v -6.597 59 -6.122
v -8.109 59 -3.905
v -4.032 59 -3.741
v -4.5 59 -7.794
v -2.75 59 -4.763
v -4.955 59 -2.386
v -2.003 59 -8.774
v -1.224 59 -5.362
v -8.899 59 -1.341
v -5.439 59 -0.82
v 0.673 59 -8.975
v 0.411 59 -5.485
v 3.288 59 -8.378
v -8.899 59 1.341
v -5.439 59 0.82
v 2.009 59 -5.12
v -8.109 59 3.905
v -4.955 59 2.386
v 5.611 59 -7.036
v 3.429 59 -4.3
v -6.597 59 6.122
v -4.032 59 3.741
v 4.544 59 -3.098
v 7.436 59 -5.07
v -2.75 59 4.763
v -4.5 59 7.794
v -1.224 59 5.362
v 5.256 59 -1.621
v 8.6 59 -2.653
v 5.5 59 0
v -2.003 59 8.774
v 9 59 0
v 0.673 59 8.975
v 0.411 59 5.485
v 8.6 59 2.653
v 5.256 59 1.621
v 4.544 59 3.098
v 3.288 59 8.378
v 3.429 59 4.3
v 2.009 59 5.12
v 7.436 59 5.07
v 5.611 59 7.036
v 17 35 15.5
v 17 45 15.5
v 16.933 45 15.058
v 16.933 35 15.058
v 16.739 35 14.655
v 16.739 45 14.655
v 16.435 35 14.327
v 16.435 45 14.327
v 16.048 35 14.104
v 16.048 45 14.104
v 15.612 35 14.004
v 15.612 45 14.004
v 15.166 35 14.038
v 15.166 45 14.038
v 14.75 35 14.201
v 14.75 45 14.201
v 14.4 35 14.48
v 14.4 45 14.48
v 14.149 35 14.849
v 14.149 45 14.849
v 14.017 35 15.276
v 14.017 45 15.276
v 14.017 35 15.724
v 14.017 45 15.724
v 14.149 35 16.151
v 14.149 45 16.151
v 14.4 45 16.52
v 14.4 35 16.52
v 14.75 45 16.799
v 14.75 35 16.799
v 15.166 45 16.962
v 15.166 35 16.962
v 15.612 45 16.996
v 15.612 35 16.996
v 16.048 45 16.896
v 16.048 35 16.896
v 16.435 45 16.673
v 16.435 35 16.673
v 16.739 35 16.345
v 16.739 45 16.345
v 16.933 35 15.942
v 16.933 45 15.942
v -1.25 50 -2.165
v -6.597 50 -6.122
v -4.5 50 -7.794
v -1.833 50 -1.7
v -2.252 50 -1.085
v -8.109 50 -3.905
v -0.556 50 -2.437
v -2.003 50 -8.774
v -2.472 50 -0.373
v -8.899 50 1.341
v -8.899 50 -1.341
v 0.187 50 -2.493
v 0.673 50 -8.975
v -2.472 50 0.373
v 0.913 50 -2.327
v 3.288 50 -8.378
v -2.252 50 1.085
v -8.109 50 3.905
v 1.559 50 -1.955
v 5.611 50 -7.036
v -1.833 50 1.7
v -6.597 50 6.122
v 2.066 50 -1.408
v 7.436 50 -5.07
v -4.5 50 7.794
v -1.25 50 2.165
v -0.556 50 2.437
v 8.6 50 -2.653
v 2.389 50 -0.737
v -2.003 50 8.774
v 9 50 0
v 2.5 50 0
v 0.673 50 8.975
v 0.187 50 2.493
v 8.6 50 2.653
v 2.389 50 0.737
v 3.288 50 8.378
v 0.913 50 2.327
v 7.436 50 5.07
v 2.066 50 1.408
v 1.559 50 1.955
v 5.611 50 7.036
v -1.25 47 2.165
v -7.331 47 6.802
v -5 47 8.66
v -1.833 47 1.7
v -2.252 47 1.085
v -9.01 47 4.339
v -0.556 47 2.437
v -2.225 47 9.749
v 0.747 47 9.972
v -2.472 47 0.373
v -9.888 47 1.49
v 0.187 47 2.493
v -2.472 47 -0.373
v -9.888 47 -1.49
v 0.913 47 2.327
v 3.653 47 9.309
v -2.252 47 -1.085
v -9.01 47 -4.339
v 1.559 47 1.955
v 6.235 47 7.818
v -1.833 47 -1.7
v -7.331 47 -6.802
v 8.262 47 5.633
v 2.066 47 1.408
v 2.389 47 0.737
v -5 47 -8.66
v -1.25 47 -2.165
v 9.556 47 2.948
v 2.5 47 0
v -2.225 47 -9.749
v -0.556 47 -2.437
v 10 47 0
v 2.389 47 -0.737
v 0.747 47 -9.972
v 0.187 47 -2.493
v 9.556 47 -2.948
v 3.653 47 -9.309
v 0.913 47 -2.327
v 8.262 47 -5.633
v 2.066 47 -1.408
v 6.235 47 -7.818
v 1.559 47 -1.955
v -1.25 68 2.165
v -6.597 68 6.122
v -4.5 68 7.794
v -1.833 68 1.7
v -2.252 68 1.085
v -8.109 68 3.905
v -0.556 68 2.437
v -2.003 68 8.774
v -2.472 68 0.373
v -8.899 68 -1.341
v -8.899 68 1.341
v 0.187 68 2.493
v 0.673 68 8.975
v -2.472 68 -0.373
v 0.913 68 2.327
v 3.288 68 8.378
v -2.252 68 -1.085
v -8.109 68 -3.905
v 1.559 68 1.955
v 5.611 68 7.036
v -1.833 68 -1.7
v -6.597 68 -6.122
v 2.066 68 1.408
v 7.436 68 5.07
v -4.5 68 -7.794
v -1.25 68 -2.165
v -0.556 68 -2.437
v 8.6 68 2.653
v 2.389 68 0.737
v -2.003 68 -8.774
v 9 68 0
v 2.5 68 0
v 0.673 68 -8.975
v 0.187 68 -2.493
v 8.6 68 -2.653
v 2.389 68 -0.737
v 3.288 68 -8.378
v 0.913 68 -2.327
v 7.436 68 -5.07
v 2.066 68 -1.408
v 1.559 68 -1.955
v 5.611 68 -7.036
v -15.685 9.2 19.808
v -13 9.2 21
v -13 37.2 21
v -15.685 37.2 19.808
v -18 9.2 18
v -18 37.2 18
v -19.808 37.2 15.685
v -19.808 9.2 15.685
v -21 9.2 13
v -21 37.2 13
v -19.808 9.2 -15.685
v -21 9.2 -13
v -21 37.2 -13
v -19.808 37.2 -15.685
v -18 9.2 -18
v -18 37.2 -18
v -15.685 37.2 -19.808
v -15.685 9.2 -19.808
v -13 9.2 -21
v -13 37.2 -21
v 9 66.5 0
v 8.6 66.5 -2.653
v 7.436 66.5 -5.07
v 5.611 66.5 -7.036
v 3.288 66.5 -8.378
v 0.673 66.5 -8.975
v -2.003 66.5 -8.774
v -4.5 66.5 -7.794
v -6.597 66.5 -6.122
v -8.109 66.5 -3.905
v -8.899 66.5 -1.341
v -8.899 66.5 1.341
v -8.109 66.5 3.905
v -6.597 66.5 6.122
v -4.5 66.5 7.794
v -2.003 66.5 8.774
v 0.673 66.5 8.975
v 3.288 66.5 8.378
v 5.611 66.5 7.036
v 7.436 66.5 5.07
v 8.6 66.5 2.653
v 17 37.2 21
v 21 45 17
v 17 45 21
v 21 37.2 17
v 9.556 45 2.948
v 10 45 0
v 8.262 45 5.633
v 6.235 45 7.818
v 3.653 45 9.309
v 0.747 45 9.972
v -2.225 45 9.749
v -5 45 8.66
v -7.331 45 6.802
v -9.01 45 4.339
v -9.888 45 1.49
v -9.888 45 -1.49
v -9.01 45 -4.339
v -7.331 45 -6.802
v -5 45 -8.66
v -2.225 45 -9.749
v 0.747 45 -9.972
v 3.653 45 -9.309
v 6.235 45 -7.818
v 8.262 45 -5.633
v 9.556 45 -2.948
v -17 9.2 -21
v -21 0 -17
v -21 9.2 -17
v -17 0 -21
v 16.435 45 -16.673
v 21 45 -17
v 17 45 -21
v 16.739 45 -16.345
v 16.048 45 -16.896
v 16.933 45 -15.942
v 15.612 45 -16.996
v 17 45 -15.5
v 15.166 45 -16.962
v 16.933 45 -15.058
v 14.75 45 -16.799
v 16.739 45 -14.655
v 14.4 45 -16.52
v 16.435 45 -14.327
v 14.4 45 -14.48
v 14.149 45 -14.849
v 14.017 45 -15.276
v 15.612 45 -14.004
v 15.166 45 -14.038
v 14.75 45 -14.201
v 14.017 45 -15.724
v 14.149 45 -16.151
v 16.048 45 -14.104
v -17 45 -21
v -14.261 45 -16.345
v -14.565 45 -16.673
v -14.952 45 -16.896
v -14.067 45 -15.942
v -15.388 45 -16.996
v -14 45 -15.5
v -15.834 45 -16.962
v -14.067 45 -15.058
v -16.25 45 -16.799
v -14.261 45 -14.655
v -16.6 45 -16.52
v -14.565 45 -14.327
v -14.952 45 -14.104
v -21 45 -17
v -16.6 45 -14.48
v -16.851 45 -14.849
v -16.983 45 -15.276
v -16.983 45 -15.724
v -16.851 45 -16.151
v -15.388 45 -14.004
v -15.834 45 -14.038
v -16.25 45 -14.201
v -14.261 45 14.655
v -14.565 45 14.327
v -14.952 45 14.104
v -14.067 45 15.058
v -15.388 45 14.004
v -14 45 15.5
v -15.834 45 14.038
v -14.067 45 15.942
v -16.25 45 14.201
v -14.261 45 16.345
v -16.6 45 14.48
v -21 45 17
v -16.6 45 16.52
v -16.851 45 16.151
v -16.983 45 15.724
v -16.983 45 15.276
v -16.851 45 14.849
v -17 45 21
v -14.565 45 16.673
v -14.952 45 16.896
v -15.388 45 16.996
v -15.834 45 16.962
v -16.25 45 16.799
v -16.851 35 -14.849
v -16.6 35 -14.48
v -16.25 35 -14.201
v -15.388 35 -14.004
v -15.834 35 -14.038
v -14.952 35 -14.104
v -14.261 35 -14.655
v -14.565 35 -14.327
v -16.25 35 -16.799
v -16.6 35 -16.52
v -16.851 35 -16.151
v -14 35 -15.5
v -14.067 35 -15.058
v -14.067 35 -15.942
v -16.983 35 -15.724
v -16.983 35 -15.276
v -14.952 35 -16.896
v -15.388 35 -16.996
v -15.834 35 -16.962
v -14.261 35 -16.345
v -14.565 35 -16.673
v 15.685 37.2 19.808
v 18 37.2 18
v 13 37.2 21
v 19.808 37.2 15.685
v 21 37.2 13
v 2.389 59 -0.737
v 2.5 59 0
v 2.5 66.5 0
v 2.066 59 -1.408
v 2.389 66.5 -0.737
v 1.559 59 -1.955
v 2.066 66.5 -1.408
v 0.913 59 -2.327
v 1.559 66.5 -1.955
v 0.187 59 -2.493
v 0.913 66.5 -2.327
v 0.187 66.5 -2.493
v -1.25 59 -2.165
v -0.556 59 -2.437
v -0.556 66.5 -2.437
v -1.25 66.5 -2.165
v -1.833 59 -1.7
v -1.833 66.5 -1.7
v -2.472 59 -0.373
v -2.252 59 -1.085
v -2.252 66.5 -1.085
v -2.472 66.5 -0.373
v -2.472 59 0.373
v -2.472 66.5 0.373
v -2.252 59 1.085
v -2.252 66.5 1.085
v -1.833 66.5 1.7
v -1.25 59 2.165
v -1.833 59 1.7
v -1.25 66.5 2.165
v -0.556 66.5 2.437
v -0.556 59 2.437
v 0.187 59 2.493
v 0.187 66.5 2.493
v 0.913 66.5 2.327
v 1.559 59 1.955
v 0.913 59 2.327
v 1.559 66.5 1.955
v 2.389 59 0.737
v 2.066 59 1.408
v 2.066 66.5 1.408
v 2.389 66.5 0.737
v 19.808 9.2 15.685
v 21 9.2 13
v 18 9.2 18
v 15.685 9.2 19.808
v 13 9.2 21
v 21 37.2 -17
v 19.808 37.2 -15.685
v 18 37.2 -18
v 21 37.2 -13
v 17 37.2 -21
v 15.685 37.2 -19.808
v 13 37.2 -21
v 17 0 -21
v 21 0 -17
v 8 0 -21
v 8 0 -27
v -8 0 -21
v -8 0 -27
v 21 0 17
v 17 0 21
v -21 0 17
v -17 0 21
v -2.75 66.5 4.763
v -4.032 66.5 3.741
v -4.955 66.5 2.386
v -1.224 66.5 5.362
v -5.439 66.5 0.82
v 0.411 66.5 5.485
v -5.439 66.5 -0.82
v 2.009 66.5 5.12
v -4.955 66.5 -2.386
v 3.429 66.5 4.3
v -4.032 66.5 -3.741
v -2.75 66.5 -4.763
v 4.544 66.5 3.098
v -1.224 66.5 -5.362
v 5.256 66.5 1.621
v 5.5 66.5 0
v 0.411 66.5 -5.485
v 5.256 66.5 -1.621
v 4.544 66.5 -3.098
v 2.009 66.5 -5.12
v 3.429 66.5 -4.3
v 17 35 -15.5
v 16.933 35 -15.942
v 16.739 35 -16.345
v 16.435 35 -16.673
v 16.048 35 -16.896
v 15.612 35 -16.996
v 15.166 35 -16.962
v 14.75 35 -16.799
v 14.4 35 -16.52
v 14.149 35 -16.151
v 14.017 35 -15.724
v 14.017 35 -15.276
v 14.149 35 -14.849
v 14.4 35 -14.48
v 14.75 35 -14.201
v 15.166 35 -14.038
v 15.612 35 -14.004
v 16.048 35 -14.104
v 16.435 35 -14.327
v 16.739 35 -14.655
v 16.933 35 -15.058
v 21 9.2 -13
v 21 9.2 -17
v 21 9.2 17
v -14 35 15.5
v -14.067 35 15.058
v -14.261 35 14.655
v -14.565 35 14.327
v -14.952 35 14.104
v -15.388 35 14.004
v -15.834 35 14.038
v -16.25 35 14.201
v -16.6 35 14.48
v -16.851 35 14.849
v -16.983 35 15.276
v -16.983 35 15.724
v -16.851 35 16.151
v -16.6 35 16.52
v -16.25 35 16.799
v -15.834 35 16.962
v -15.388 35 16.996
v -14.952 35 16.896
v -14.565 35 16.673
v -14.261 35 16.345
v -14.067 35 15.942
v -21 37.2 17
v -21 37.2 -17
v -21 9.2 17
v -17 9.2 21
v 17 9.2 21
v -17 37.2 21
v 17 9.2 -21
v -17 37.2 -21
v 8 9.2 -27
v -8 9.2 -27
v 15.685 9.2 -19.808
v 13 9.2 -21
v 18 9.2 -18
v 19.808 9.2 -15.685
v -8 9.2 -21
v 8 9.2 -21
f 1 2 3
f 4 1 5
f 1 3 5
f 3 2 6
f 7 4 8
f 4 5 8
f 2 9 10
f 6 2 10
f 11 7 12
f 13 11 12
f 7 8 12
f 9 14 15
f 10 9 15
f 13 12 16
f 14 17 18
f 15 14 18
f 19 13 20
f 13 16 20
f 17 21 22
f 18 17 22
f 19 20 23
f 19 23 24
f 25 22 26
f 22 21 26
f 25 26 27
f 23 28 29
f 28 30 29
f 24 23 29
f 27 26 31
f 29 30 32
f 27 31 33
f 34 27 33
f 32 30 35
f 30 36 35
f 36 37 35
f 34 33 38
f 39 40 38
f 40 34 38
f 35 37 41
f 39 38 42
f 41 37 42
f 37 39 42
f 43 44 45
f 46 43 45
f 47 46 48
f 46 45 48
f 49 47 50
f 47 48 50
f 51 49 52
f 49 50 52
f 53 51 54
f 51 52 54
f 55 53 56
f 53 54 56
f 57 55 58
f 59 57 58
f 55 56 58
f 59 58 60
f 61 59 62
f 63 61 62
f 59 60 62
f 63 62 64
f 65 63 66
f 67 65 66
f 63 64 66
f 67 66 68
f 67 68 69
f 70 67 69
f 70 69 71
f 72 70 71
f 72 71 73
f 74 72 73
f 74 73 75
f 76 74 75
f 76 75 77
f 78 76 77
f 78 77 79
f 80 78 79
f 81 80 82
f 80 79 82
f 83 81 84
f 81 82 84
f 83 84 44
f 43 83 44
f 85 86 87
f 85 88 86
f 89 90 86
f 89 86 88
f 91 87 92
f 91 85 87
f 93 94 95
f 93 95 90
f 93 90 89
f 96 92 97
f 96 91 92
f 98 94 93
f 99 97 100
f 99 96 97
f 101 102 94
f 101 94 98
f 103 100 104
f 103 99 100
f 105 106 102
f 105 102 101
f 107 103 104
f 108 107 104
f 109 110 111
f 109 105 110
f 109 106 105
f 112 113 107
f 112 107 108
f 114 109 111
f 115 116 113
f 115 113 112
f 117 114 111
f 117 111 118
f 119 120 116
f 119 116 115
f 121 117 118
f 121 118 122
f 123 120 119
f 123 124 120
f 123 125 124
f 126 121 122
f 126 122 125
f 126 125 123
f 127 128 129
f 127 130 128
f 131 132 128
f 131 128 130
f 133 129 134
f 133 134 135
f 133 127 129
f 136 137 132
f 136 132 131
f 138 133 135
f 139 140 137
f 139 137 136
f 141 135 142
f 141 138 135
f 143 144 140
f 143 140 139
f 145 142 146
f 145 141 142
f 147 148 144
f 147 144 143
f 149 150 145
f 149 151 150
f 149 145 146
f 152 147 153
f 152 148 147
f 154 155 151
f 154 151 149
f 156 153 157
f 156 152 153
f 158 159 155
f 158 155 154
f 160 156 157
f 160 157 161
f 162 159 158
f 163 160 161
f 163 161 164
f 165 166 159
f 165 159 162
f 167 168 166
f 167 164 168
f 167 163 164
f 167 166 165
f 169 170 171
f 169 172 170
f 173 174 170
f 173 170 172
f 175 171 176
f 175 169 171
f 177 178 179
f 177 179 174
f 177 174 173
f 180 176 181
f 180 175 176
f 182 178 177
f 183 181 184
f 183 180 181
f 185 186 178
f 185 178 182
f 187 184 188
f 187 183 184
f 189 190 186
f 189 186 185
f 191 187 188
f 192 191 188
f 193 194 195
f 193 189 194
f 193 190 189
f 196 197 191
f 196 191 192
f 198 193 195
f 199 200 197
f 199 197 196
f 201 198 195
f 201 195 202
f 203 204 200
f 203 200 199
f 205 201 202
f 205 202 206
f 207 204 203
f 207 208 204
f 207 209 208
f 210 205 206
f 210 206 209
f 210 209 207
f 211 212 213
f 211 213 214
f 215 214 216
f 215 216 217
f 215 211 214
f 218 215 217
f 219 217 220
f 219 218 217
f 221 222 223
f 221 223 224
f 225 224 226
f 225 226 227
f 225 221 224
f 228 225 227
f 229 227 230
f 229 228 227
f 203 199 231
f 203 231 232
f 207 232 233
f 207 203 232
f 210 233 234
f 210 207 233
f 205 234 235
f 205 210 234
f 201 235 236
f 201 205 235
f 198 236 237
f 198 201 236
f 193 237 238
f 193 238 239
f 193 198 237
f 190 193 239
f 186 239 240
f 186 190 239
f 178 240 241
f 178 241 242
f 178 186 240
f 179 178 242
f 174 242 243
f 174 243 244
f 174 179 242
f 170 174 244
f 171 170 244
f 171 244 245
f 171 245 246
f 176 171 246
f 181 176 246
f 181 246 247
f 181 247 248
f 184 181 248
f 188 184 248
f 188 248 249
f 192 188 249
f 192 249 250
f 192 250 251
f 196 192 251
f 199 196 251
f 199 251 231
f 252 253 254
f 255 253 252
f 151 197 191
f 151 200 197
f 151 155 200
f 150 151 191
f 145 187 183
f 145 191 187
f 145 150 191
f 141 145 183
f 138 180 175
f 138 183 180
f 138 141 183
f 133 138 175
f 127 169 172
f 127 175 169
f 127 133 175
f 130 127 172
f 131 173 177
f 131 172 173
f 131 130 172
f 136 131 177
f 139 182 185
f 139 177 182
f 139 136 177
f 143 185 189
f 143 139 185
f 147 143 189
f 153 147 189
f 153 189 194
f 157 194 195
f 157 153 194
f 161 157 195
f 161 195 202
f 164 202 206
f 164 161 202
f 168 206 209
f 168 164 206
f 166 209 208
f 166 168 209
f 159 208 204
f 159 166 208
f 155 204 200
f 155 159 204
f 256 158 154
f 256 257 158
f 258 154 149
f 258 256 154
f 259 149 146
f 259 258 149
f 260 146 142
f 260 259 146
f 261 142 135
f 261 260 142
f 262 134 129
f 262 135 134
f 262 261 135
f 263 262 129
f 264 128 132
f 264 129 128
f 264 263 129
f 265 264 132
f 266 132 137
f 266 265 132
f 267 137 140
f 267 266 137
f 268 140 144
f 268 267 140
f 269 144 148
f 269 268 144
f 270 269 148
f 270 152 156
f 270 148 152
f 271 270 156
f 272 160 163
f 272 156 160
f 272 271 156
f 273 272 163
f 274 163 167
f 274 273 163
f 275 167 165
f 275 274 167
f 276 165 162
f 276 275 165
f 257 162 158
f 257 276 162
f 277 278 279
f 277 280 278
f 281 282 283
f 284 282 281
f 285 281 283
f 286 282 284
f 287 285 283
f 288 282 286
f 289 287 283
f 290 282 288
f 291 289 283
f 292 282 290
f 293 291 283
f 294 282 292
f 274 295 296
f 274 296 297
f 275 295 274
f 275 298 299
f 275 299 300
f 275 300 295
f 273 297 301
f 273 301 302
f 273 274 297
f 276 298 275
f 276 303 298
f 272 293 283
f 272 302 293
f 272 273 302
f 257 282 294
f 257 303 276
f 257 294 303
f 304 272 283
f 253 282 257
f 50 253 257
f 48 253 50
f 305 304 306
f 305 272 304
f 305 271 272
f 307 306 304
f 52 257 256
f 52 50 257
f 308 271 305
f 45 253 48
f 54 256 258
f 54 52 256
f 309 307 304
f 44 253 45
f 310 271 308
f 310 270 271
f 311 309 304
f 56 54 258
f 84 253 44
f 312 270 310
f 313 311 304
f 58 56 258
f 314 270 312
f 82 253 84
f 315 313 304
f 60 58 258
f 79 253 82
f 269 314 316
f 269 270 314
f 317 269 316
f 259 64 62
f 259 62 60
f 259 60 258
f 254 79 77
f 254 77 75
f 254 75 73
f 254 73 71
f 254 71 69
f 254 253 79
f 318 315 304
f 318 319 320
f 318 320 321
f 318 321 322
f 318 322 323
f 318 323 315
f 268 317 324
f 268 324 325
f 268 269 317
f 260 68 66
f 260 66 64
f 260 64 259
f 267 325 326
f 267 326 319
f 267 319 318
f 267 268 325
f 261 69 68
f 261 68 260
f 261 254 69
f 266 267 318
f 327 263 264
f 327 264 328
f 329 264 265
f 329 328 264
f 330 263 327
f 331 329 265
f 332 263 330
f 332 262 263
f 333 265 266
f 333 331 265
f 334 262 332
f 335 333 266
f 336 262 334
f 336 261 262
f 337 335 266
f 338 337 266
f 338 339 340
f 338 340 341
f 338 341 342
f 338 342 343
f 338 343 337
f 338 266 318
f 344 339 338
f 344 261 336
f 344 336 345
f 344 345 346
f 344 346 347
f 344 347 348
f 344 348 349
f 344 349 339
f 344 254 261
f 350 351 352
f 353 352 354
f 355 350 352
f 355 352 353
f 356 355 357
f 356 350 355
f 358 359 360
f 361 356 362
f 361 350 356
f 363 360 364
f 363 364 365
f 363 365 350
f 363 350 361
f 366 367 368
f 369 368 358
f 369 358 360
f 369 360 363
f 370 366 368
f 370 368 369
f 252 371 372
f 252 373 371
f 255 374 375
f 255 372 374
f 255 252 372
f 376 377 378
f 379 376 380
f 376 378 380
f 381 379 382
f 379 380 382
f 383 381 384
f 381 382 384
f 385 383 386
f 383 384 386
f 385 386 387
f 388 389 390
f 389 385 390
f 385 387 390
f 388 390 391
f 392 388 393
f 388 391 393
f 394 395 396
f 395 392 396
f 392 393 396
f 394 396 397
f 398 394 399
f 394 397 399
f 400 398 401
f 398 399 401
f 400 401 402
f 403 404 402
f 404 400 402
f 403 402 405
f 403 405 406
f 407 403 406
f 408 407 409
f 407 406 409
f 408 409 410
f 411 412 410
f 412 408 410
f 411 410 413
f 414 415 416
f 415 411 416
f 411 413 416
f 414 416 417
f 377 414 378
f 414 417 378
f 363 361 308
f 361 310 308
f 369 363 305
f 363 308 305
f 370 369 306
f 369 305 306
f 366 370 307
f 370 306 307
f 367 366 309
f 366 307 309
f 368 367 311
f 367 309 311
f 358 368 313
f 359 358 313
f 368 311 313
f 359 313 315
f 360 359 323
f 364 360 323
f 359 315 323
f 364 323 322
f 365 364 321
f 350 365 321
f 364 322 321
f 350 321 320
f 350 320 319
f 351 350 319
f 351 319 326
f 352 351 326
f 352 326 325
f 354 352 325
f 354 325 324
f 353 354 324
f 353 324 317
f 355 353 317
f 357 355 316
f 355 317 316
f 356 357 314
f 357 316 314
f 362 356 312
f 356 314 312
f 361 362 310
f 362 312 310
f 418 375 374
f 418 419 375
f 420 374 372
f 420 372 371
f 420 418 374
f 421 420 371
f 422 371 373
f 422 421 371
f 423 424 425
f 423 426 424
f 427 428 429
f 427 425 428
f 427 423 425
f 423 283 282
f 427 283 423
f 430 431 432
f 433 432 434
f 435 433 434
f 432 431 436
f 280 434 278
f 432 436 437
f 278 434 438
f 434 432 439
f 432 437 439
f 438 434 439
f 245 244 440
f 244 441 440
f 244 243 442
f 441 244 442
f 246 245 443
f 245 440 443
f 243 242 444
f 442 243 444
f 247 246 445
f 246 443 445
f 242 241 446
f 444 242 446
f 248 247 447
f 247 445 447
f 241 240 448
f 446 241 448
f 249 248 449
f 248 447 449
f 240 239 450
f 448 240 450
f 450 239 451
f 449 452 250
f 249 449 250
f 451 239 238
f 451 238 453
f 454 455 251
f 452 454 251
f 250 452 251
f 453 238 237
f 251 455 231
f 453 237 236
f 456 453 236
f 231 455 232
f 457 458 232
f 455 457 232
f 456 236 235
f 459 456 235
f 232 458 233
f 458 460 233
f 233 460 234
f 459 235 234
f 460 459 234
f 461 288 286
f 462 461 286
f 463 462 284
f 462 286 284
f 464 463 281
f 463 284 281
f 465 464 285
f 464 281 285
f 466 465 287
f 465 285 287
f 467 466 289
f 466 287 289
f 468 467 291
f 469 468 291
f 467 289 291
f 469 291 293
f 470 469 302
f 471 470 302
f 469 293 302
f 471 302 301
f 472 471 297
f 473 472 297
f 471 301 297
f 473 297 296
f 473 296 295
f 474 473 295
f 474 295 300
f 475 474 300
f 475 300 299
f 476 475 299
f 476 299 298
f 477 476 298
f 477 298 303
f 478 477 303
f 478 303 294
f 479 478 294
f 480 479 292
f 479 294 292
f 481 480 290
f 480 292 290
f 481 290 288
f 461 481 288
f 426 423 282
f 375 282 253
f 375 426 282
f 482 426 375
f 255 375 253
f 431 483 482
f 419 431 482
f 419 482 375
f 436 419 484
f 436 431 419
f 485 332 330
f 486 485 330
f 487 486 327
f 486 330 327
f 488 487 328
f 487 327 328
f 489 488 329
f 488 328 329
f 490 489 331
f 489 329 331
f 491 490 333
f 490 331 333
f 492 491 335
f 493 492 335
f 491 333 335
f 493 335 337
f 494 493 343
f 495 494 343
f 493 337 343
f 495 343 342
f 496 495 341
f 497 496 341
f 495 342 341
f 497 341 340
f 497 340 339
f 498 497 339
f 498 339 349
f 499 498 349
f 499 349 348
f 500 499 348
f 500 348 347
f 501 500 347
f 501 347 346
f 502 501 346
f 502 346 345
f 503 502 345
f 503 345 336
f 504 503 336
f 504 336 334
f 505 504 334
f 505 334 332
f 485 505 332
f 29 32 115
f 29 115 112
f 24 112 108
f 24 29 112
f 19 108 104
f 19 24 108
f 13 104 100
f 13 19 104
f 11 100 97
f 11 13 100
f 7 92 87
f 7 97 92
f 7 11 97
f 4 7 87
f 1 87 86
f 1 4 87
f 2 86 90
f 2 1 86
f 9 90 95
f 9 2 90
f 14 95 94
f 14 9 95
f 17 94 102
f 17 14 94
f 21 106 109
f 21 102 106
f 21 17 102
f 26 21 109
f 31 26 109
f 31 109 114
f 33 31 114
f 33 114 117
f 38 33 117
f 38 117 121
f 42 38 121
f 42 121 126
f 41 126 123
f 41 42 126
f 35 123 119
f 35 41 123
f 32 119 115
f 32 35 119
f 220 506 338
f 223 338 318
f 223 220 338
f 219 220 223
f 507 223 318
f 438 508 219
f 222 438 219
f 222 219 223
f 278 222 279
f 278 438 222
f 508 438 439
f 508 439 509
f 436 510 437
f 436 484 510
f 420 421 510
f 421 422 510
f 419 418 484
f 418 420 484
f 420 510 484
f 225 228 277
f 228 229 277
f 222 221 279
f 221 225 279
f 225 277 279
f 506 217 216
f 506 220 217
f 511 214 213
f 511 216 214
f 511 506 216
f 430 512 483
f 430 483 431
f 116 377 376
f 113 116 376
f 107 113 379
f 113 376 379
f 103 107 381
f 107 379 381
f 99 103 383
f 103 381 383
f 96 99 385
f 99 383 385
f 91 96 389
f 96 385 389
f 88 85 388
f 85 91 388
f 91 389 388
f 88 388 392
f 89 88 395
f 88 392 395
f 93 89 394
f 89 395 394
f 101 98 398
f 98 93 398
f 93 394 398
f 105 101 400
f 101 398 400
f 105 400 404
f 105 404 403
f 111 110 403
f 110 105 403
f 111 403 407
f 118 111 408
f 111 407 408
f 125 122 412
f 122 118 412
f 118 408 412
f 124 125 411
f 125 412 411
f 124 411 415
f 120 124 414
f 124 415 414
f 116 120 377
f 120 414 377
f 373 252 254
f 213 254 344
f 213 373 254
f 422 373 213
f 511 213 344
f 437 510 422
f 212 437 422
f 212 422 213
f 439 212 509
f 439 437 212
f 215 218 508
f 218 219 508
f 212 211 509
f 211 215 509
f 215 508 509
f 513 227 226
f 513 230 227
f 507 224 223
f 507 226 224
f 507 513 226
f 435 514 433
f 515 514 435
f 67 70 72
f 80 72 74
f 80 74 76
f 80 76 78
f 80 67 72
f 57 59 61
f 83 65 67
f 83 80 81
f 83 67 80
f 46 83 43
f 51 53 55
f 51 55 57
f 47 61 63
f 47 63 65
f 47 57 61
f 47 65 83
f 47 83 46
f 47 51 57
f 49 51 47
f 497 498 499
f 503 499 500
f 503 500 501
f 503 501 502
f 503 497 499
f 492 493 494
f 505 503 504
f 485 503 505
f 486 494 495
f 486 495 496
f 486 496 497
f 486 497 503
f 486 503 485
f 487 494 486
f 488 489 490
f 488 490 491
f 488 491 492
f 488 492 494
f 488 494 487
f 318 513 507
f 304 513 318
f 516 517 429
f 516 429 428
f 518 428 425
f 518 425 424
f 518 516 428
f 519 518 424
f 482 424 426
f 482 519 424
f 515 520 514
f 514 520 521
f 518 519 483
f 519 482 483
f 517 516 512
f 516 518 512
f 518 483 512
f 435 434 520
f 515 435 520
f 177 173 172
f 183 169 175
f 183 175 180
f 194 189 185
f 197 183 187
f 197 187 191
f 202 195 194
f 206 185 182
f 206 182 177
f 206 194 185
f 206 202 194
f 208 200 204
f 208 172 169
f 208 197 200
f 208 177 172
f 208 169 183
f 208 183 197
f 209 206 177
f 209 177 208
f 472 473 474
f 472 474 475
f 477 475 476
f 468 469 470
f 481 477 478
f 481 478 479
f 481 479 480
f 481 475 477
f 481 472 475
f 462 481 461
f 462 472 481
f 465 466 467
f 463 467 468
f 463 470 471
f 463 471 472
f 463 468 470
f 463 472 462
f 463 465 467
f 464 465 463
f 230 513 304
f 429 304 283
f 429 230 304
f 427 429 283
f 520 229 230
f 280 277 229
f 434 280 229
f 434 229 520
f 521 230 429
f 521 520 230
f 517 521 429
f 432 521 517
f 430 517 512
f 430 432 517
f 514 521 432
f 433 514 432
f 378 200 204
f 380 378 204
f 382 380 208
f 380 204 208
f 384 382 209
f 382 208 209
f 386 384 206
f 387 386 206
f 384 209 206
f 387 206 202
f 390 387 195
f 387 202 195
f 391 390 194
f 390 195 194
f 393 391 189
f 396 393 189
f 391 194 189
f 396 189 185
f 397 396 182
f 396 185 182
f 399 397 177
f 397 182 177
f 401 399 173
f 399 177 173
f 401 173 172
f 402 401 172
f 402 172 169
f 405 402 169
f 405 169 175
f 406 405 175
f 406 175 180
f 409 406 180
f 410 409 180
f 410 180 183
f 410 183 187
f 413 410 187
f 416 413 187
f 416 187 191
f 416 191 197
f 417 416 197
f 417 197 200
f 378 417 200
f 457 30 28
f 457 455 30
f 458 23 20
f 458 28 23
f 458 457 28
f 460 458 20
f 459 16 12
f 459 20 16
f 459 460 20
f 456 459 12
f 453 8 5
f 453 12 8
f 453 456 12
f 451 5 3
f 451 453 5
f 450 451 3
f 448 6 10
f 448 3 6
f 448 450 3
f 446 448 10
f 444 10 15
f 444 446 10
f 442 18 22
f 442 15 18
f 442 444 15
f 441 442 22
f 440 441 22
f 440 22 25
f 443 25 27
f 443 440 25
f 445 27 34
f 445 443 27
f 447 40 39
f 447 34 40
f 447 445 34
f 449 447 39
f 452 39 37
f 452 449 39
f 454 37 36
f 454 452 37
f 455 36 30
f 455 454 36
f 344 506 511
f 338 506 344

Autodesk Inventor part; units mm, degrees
ref_plane "YZ Plane" through (0, 0, 0) normal (1, 0, 0) x (0, 1, 0)
ref_plane "XZ Plane" through (0, 0, 0) normal (0, 1, 0) x (-1, 0, 0)
ref_plane "XY Plane" through (0, 0, 0) normal (0, 0, 1) x (1, 0, 0)
sketch "Sketch1" plane through (0, 0, 0) normal (0, 1, 0) x (-1, 0, 0)
  line L0 (-21, 21) -> (21, 21)
  line L1 (21, 21) -> (21, -21)
  line L2 (21, -21) -> (-21, -21)
  line L3 (-21, -21) -> (-21, 21)
  line L4 (-21, 21) -> (21, -21) construction
  line L5 (21, 21) -> (-21, -21) construction
  point P0 (0, 0)
  dimension "d0" = 42
  dimension "d1" = 42
extrude "Extrusion1" add sketch "Sketch1" along normal blind 45
sketch "Sketch3" plane through (0, 45, 0) normal (0, 1, 0) x (1, 0, 0)
  circle A0 centre (0, 0) radius 10
  dimension "d4" = 20
extrude "Extrusion2" add sketch "Sketch3" along normal blind 2
sketch "Sketch4" plane through (0, 45, 0) normal (0, 1, 0) x (1, 0, 0)
  circle A0 centre (0, 0) radius 10 projected
  line L0 (-15.5, 15.5) -> (15.5, 15.5)
  line L1 (15.5, 15.5) -> (15.5, -15.5)
  line L2 (15.5, -15.5) -> (-15.5, -15.5)
  line L3 (-15.5, -15.5) -> (-15.5, 15.5)
  line L4 (-15.5, 15.5) -> (15.5, -15.5) construction
  line L5 (15.5, 15.5) -> (-15.5, -15.5) construction
  circle A1 centre (15.5, 15.5) radius 1.5
  circle A2 centre (-15.5, 15.5) radius 1.5
  circle A3 centre (-15.5, -15.5) radius 1.5
  circle A4 centre (15.5, -15.5) radius 1.5
  dimension "d7" = 31
  dimension "d8" = 31
  dimension "d9" = 3
  dimension "d10" = 3
  dimension "d11" = 3
  dimension "d12" = 3
extrude "Extrusion3" cut sketch "Sketch4" against normal blind 10 contours L3 A2 L0 | L0 A2 L3 | A1 L1 L0 | L0 L1 A1 | A3 L2 L3 | L3 L2 A3 | A4 L2 L1 | L1 L2 A4
chamfer "Chamfer1" distance 4 angle 45 4 edges at (-21, 22.5, -21) (21, 22.5, -21) (-21, 22.5, 21) (21, 22.5, 21)
sketch "Sketch5" plane through (0, 47, 0) normal (0, 1, 0) x (1, 0, 0)
  circle A0 centre (0, 0) radius 10 projected
  circle A1 centre (0, 0) radius 2.5
  dimension "d18" = 5
extrude "Extrusion4" add sketch "Sketch5" along normal blind 21 contours A1
ref_plane "Work Plane1" through (0, 9.2, 0) normal (0, -1, 0) x (1, 0, 0)
sketch "Sketch6" plane through (0, 9.2, 0) normal (0, -1, 0) x (1, 0, 0)
  line L0 (17, 21) -> (21, 17) projected
  line L1 (17, 21) -> (-17, 21) projected
  line L2 (-21, 17) -> (-17, 21) projected
  line L3 (-21, 17) -> (-21, -17) projected
  line L4 (-17, -21) -> (-21, -17) projected
  line L5 (-17, -21) -> (17, -21) projected
  line L6 (21, -17) -> (17, -21) projected
  line L7 (21, -17) -> (21, 17) projected
  arc A0 (21, 13) -> (13, 21) centre (9.5, 9.5) ccw
  point P0 (0, 0)
extrude "Extrusion5" cut sketch "Sketch6" against normal blind 28 contours L0 L7 A0 L1
pattern_circular "Circular Pattern1" count 4 over 360 about axis through (0, 47, 0) along (0, 1, 0) of "Extrusion5"
sketch "Sketch7" plane through (0, 68, 0) normal (0, 1, 0) x (1, 0, 0)
  circle A0 centre (0, 0) radius 2.5 projected
  circle A1 centre (0, 0) radius 9
  dimension "d27" = 18
extrude "Extrusion6" add sketch "Sketch7" against normal blind 1.5 separate body
sketch "Sketch8" plane through (0, 66.5, 0) normal (0, -1, 0) x (1, 0, 0)
  circle A0 centre (0, 0) radius 2.5 projected
  circle A1 centre (0, 0) radius 9 projected
  circle A2 centre (0, 0) radius 5.5
  dimension "d30" = 11
extrude "Extrusion7" add sketch "Sketch8" along normal blind 7.5 contours A2 bodies 2
sketch "Sketch9" plane through (0, 59, 0) normal (0, -1, 0) x (1, 0, 0)
  circle A0 centre (0, 0) radius 2.5 projected
  circle A1 centre (0, 0) radius 5.5 projected
  circle A2 centre (0, 0) radius 9
  dimension "d33" = 18
extrude "Extrusion8" add sketch "Sketch9" along normal blind 9 contours A1 | A2 bodies 2
sketch "Sketch10" plane through (17, 0, -21) normal (0, 0, -1) x (-1, 0, 0)
  line L0 (4, 9.2) -> (0, 9.2) projected
  line L1 (34, 0) -> (0, 0) projected
  line L2 (9, 0) -> (25, 0)
  line L3 (25, 0) -> (25, 9.2)
  line L4 (25, 9.2) -> (9, 9.2)
  line L5 (9, 9.2) -> (9, 0)
  point P0 (17, 0)
  dimension "d36" = 16
  dimension "d37" = 8
extrude "Extrusion9" add sketch "Sketch10" along normal blind 6 bodies 1
properties part number "stepmotor small" material "Steel"
